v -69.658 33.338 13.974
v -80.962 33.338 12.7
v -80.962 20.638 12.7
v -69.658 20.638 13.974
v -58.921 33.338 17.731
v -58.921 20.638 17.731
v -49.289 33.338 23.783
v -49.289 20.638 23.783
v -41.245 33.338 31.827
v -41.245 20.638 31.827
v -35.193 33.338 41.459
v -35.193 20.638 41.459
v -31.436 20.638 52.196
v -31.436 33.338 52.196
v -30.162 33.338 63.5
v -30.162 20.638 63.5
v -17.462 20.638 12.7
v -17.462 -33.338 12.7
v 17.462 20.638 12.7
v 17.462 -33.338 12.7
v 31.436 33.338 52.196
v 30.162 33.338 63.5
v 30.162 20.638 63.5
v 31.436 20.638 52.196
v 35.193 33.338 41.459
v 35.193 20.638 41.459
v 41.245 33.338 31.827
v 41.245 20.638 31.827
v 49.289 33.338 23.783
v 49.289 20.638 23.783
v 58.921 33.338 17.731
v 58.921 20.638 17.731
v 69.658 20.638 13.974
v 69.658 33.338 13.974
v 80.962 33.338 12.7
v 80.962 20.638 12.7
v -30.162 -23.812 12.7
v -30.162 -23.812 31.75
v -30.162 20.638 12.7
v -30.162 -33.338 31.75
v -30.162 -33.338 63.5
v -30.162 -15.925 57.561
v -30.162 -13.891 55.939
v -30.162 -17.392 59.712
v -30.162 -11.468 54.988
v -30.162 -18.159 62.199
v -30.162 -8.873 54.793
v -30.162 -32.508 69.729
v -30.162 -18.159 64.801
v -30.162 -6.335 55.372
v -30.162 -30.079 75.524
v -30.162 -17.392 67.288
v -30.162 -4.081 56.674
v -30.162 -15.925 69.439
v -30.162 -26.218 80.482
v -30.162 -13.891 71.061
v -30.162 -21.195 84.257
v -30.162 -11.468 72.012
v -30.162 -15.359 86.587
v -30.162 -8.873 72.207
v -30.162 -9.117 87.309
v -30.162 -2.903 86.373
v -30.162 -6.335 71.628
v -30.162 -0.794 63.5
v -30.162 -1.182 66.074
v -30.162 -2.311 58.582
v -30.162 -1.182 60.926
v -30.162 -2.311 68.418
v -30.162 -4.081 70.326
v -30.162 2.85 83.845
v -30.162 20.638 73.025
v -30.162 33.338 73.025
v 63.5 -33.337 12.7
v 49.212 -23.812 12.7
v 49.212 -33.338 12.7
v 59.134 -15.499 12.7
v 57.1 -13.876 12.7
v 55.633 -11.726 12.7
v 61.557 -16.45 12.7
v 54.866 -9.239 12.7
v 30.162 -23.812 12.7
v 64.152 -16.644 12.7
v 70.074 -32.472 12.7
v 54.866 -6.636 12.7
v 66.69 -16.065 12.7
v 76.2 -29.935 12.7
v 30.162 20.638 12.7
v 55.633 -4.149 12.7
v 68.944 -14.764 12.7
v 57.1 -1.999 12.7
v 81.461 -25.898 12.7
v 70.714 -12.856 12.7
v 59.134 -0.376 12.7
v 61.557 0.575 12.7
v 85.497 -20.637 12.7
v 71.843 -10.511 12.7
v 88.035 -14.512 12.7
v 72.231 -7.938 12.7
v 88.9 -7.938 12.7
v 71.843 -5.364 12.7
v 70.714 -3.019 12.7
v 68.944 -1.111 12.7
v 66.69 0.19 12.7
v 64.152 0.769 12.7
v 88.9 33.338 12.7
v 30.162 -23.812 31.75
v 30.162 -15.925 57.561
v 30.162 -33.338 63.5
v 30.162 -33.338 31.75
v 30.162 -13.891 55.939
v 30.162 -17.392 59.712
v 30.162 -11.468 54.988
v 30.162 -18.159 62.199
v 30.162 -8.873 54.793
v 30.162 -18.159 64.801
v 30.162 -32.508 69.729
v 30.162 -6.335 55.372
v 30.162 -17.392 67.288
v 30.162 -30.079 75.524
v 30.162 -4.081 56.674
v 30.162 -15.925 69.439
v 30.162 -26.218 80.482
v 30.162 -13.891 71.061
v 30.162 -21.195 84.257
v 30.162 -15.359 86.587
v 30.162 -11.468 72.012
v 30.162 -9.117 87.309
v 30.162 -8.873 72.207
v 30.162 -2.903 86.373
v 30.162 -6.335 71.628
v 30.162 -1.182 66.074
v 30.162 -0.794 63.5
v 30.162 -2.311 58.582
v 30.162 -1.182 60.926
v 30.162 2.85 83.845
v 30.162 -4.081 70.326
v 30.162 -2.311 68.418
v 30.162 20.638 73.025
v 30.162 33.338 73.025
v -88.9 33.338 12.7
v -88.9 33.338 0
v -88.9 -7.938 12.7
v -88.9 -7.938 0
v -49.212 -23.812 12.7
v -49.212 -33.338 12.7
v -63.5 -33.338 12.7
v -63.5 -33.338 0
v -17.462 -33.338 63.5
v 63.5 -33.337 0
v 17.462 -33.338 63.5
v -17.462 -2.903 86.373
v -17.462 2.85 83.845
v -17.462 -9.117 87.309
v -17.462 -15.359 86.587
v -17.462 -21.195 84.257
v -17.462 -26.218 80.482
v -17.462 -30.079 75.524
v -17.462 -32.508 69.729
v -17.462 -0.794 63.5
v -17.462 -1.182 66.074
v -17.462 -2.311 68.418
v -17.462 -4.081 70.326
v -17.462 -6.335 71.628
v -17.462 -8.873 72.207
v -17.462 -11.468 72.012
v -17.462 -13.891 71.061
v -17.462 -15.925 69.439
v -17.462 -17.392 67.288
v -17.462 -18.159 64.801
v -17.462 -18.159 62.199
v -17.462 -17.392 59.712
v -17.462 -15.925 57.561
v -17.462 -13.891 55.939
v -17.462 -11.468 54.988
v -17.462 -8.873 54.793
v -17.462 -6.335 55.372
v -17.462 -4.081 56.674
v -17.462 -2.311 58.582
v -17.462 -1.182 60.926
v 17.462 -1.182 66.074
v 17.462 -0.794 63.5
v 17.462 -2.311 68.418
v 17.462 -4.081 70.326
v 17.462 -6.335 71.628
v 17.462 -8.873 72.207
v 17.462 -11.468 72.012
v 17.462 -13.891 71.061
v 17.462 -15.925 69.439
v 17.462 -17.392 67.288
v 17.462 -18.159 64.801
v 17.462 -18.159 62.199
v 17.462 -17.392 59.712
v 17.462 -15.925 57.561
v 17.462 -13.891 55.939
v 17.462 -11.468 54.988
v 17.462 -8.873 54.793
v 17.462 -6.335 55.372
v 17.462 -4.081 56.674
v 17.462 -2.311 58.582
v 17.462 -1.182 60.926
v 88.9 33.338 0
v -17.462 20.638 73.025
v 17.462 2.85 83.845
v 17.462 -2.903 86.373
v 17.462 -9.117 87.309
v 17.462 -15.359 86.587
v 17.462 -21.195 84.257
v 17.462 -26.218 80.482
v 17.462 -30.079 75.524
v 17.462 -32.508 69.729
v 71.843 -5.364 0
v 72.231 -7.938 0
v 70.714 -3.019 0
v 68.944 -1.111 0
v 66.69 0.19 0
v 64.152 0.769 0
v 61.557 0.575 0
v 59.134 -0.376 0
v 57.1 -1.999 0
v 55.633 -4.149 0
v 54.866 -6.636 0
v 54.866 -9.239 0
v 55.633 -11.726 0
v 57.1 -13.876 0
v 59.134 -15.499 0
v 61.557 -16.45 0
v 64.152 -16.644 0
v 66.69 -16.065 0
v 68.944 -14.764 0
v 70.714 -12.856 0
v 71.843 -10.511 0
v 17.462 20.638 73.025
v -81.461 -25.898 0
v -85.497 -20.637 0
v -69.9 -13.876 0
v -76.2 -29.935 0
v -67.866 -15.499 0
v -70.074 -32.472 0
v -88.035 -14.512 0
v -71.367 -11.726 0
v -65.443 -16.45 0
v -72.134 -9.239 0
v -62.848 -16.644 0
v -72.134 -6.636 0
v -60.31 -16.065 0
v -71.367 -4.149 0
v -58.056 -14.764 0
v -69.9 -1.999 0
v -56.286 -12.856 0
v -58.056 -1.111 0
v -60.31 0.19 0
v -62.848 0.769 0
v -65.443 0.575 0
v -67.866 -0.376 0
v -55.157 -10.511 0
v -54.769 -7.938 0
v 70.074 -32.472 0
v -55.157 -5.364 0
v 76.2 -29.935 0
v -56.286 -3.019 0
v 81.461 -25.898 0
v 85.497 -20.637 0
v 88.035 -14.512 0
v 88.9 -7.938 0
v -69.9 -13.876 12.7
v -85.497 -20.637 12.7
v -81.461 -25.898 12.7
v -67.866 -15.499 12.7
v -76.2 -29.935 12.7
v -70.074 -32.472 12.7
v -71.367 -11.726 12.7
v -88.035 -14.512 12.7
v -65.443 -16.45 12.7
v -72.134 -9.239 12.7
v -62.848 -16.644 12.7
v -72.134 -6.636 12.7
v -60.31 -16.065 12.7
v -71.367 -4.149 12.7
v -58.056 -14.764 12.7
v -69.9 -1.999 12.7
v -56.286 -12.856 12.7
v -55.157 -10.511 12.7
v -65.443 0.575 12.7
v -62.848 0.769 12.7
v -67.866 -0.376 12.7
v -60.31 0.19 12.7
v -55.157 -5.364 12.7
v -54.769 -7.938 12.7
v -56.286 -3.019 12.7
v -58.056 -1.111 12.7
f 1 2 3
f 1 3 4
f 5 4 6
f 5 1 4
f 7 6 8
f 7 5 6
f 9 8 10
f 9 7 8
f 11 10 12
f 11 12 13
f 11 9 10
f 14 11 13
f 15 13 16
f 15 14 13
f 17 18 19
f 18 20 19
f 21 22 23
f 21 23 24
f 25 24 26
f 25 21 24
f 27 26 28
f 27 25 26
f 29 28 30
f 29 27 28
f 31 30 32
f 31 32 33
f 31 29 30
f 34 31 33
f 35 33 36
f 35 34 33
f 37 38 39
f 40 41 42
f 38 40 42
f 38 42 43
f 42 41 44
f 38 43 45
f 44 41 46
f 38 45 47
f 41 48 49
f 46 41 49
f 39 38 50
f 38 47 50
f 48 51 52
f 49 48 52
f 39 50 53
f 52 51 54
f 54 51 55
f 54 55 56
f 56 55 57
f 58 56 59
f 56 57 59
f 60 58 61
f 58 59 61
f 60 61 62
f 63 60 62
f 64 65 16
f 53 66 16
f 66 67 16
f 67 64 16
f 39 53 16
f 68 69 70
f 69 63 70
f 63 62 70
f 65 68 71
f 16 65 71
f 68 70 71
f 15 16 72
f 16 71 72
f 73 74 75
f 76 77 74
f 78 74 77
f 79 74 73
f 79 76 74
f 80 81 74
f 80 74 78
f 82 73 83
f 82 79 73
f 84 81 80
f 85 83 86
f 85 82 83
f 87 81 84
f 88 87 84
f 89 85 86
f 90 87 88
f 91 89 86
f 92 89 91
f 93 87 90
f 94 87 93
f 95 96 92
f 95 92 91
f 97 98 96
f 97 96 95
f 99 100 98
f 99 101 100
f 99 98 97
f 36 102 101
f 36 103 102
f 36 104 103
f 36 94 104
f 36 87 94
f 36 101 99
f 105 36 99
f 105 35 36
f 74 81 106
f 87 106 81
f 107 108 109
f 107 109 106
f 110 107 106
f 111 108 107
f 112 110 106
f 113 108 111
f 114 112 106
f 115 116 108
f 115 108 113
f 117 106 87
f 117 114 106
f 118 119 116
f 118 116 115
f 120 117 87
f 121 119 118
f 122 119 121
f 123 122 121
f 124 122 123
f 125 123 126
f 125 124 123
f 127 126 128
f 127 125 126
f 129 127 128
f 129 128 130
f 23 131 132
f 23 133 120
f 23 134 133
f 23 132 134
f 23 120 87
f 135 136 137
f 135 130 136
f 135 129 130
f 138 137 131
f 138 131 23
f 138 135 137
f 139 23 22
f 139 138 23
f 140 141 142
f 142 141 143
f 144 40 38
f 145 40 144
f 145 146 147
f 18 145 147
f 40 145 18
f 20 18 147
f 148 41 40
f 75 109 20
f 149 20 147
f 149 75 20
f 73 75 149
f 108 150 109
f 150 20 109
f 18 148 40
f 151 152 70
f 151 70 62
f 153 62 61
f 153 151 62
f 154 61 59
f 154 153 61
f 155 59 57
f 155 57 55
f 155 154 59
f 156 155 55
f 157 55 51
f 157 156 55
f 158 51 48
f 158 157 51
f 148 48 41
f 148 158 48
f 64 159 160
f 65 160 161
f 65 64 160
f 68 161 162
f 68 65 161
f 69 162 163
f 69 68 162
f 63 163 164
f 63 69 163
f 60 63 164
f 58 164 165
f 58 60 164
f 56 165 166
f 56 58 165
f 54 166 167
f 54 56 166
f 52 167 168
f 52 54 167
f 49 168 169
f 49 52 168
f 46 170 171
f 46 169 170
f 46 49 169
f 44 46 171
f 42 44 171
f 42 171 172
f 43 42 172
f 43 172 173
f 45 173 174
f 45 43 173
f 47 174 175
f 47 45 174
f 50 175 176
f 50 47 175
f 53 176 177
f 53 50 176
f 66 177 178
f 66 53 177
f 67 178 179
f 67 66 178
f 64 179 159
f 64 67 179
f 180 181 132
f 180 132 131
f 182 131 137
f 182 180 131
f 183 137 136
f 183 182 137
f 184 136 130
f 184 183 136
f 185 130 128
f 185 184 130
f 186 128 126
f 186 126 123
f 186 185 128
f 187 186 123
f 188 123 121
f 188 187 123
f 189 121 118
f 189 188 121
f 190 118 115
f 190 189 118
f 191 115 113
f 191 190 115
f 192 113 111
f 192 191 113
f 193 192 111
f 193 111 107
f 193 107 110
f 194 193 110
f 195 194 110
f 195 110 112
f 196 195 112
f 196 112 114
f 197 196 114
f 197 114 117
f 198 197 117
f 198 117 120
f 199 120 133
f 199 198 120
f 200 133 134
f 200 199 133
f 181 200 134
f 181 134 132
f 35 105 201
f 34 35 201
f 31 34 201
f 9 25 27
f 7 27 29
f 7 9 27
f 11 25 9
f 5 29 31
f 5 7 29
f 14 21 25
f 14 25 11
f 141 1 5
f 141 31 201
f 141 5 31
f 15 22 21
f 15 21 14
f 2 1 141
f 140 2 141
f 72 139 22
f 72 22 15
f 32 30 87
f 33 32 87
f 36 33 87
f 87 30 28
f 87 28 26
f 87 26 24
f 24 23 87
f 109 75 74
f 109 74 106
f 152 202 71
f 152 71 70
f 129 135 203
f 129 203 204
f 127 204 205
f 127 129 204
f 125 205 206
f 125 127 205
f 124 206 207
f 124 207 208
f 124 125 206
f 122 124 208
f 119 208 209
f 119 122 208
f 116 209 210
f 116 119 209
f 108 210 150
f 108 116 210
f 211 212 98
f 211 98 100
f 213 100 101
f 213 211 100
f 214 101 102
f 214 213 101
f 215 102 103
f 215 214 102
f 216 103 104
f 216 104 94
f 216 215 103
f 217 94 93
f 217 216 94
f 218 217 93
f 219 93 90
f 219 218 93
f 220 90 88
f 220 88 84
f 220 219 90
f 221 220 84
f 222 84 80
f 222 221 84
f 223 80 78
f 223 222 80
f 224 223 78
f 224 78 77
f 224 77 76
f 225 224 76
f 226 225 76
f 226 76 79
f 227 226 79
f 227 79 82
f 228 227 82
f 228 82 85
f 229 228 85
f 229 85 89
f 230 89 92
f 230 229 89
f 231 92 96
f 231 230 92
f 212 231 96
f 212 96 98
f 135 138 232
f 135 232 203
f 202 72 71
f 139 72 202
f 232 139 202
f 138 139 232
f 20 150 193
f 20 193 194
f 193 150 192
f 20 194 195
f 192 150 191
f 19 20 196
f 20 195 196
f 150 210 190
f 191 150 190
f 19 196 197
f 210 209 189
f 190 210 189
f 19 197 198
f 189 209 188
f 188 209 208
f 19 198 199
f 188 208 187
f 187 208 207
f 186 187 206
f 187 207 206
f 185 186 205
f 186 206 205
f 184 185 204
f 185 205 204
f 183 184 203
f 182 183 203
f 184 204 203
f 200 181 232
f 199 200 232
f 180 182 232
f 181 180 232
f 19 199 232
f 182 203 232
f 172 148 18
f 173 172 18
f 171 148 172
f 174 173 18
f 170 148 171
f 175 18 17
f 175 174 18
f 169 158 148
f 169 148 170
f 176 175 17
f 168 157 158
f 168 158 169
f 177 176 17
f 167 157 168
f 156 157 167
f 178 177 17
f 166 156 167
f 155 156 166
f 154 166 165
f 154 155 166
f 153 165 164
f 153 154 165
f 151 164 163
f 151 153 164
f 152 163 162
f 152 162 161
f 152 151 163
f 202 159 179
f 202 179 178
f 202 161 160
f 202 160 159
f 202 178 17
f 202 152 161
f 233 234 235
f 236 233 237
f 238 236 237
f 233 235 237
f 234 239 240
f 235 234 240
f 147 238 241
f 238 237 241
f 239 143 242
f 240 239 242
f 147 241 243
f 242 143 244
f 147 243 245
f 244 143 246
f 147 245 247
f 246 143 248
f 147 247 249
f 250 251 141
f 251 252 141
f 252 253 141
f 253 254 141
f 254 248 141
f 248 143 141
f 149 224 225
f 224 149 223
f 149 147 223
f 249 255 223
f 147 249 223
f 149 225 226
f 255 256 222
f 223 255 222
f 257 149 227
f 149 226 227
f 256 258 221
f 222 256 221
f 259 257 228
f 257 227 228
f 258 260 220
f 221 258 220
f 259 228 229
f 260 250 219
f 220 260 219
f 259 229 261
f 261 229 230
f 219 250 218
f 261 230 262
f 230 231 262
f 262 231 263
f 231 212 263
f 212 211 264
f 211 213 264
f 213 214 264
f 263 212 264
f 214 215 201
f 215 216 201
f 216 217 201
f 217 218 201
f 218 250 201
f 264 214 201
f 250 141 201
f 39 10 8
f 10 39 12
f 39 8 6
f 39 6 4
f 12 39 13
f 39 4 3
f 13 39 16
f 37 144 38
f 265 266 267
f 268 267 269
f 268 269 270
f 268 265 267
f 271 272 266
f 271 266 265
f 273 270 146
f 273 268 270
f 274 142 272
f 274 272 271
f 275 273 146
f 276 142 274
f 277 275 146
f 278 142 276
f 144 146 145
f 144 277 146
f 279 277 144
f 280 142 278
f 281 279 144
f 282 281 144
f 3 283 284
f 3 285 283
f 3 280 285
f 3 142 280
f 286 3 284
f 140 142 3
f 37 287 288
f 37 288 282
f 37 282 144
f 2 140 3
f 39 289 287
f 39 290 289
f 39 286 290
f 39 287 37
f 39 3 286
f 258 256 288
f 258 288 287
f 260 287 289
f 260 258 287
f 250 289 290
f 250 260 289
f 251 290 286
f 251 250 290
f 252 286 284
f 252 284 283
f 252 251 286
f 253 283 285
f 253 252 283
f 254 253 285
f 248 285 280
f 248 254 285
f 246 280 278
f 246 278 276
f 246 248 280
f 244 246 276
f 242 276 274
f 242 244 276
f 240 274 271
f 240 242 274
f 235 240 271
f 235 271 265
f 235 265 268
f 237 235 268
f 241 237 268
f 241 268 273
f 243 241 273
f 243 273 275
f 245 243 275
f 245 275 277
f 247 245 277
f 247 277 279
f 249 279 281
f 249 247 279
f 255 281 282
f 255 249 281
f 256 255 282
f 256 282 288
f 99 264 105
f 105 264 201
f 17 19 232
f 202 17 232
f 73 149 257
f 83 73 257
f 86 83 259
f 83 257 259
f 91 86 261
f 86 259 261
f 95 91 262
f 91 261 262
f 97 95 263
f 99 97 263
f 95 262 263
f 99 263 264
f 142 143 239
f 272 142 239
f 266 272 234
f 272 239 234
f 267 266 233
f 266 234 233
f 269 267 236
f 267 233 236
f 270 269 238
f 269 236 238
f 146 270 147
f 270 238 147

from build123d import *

# Parameters (mm, degrees)
F0_R     = 8.73125
F1_DEPTH = 12.7
F2_R     = 8.73125
F3_DEPTH = 30.1625
F5_DEPTH = 17.4625
F7_DEPTH = 9.525
F9_DEPTH = 12.7


with BuildPart() as f1:
    # F0 (on Top) → F1 (new body)
    with BuildSketch(Plane.XY):
        with BuildLine():
            ThreePointArc((-88.9, -7.9375), (-81.460512, -25.898012), (-63.5, -33.3375))
            ThreePointArc((-63.5, -33.3375), (-45.539488, -25.898012), (-38.1, -7.9375))
            ThreePointArc((-38.1, -7.9375), (-63.5, 17.4625), (-88.9, -7.9375))
        make_face()
        with Locations((-63.5, -7.9375)):
            Circle(F0_R, mode=Mode.SUBTRACT)
        with BuildLine():
            ThreePointArc((-38.1, -7.9375), (-45.539488, -25.898012), (-63.5, -33.3375))
            Line((-63.5, -33.3375), (63.5, -33.3375))
            ThreePointArc((63.5, -33.3375), (45.539488, 10.023012), (88.9, -7.9375))
            Line((88.9, -7.9375), (88.9, 33.3375))
            Line((88.9, 33.3375), (-88.9, 33.3375))
            Line((-88.9, 33.3375), (-88.9, -7.9375))
            ThreePointArc((-88.9, -7.9375), (-63.5, 17.4625), (-38.1, -7.9375))
        make_face()
        with BuildLine():
            ThreePointArc((88.9, -7.9375), (45.539488, 10.023012), (63.5, -33.3375))
            ThreePointArc((63.5, -33.3375), (81.460512, -25.898012), (88.9, -7.9375))
        make_face()
        with Locations((63.5, -7.9375)):
            Circle(F0_R, mode=Mode.SUBTRACT)
    extrude(amount=F1_DEPTH)

    # F2 (on Right) → F3 (join, symmetric)
    with BuildSketch(Plane.YZ):
        with BuildLine():
            Line((-33.3375, 63.5), (-33.3375, 12.7))
            Line((-33.3375, 12.7), (-7.9375, 12.7))
            Line((-7.9375, 12.7), (33.3375, 12.7))
            Line((33.3375, 12.7), (33.3375, 73.025))
            Line((33.3375, 73.025), (20.6375, 73.025))
            Line((20.6375, 73.025), (2.849747, 83.844552))
            ThreePointArc((2.849747, 83.844552), (11.232033, 75.169651), (14.2875, 63.5))
            ThreePointArc((14.2875, 63.5), (-9.525, 39.6875), (-33.3375, 63.5))
        make_face()
        with BuildLine():
            ThreePointArc((2.849747, 83.844552), (-21.194651, 84.257033), (-33.3375, 63.5))
            ThreePointArc((-33.3375, 63.5), (-9.525, 39.6875), (14.2875, 63.5))
            ThreePointArc((14.2875, 63.5), (11.232033, 75.169651), (2.849747, 83.844552))
        make_face()
        with Locations((-9.525, 63.5)):
            Circle(F2_R, mode=Mode.SUBTRACT)
    extrude(amount=F3_DEPTH, both=True)

    # F4 (on Right) → F5 (cut, symmetric)
    with BuildSketch(Plane.YZ):
        with BuildLine():
            Line((-33.3375, 12.7), (-7.9375, 12.7))
            Line((-7.9375, 12.7), (20.6375, 12.7))
            Line((20.6375, 12.7), (20.6375, 73.025))
            Line((20.6375, 73.025), (2.849747, 83.844552))
            ThreePointArc((2.849747, 83.844552), (-21.194651, 84.257033), (-33.3375, 63.5))
            Line((-33.3375, 63.5), (-33.3375, 12.7))
        make_face()
    extrude(amount=F5_DEPTH, both=True, mode=Mode.SUBTRACT)

    # F6 (on face) → F7 (join)
    with BuildSketch(Plane.XZ.offset(33.3375)):
        Polygon((-30.1625, 31.75), (-49.2125, 12.7), (-30.1625, 12.7), align=None)
        Polygon((30.1625, 31.75), (30.1625, 12.7), (49.2125, 12.7), align=None)
    extrude(amount=-F7_DEPTH)

    # F8 (on face) → F9 (join, through all)
    with BuildSketch(Plane(origin=(0, 33.3375, 0), x_dir=(-1, 0, 0), z_dir=(0, 1, 0))):
        with BuildLine():
            ThreePointArc((-30.1625, 63.5), (-45.041476, 27.578976), (-80.9625, 12.7))
            Line((-80.9625, 12.7), (-30.1625, 12.7))
            Line((-30.1625, 12.7), (-30.1625, 63.5))
        make_face()
        with BuildLine():
            ThreePointArc((80.9625, 12.7), (45.041476, 27.578976), (30.1625, 63.5))
            Line((30.1625, 63.5), (30.1625, 12.7))
            Line((30.1625, 12.7), (80.9625, 12.7))
        make_face()
    extrude(amount=-F9_DEPTH)


solid = f1.part
